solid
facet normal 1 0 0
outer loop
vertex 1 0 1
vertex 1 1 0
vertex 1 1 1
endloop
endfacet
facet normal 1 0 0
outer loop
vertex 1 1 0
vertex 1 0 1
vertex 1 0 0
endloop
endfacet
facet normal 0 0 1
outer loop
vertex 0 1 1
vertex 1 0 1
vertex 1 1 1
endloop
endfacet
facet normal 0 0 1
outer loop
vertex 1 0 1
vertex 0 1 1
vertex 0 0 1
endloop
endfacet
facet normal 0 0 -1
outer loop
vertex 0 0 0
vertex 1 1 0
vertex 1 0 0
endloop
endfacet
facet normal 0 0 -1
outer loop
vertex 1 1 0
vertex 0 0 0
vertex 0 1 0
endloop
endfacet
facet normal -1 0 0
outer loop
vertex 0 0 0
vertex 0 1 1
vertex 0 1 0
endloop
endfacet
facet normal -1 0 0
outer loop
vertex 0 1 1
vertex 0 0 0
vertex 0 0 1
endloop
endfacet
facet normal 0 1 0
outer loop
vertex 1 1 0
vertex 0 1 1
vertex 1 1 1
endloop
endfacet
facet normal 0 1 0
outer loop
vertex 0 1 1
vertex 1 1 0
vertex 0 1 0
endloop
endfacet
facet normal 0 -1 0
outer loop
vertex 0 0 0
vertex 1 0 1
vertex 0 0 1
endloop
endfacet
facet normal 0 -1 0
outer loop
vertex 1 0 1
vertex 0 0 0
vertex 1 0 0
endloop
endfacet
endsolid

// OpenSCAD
// CanFactory prototype-board wire guide: one printed piece of a wire-guide design (#152, #170, docs/wire-guide.md): a whole print,
// one separate layer of a print, or one of its separate pegs.
//
// Every number comes from trusted code: wireGuideScad (packages/contracts/src/prototypeWireGuide.ts) works out each print's
// plate, channels, bridges, funnels, pockets and registration from the validated design and passes them as GUIDE, a list
// with one entry per print; PRINT picks this file's print. Nothing of the design but numbers reaches this file.
//
// Frame: the board's (mm). The PCB's underside on z = 0, its corner at the origin, seen from the component side: columns
// along +X, rows along +Y. The print is drawn where it sits on the board, channels open upwards.
//
// GUIDE[PRINT] = [
//   [x0, y0, pitch],                         grid: hole (c, r) at (x0 + c * pitch, y0 + r * pitch)
//   [bx0, by0, bx1, by1, zBase, zTop],       the block
//   plateTop,                                the plate's top, the lowest channel floor
//   [[floor, bridgeBottom], ...],            per channel layer, lowest first (bridgeBottom -1 for the lowest)
//   [[layer, width, [c0, r0, c1, r1, ...]], ...],   wires: their layer, channel width and grid points
//   [[x, y, bottomD, topD], ...],            funnels at the wire ends
//   [[kind, x, y, a, b, top], ...],          pockets: kind 0 a box (x, y, w = a, h = b), 1 a cylinder (centre x, y, d = a)
//   [[x, y, columnD, pinD, pinBottom, columnBottom, top], ...],   mounting-hole bosses (columnBottom -1: no column)
//   [[x, width], ...],                       edge clips at y = 0 and y = W
//   [L, W, t],                               the board
//   layered,                                 1: made as separate layers and pegs (no bosses: holes for the pegs), 0: one piece
//   [[zBottom, zTop], ...],                  layers, lowest first: the slice of the block each is (layered only)
//   [[x, y, d, bottom, top], ...],           the pegs' holes, from `bottom` to `top` (layered only)
//   [[[r, z], ...], ...],                    each peg's outline, turned about its axis, from its lowest point at z = 0
// ]
//
// LAYER -1 and PEG -1: the whole print, drawn where it sits on the board (a one-piece print). LAYER k: its layer k, lying on the
// print bed (its underside on z = 0). PEG j: its peg j, upright, its lowest point on z = 0 at the origin.

GUIDE = [];
PRINT = 0;
LAYER = -1;
PEG = -1;

$fn = 32;
// Fixed dimensions, as WIRE_GUIDE_GEOMETRY.clip.
CLIP_GAP = 0.2; CLIP_WALL = 1.4; CLIP_LIP = 0.6; CLIP_BELOW = 1.4; CLIP_LIP_GAP = 0.15; CLIP_FOOT = 0.6;
// Bridges are this much narrower than the channel they carry, so that their sides never coincide with it.
BRIDGE_INSET = 0.01;

P = GUIDE[PRINT];
grid = P[0]; block = P[1]; plate_top = P[2]; layers = P[3]; wires = P[4];
funnels = P[5]; pockets = P[6]; bosses = P[7]; clips = P[8]; board = P[9];
layered = P[10] == 1; slices = P[11]; holes = P[12]; pegs = P[13];
z_base = block[4]; z_top = block[5];

function at(c, r) = [grid[0] + c * grid[2], grid[1] + r * grid[2]];

// The 2D footprint of a wire's channel: a rectangle per segment, each reaching half the width past its ends (square corners).
module channel_2d(points, width) {
  n = len(points) / 2;
  for (i = [0 : n - 2]) {
    a = at(points[2 * i], points[2 * i + 1]);
    b = at(points[2 * i + 2], points[2 * i + 3]);
    translate([min(a[0], b[0]) - width / 2, min(a[1], b[1]) - width / 2])
      square([abs(b[0] - a[0]) + width, abs(b[1] - a[1]) + width]);
  }
}

// One layer's channels: open from its floor up through the top, except under the bridges of every higher layer.
module layer_cut(layer) {
  difference() {
    translate([0, 0, layers[layer][0]]) linear_extrude(z_top + 1 - layers[layer][0])
      union() for (w = wires) if (w[0] == layer) channel_2d(w[2], w[1]);
    for (higher = [for (i = [0 : len(layers) - 1]) if (i > layer) i])
      translate([0, 0, layers[higher][1]]) linear_extrude(z_top + 2 - layers[higher][1])
        union() for (w = wires) if (w[0] == higher) channel_2d(w[2], w[1] - 2 * BRIDGE_INSET);
  }
}

// One layer's channels alone, open from its floor up through the top (a separate layer: nothing of a higher one is over them).
module own_cut(layer) {
  translate([0, 0, layers[layer][0]]) linear_extrude(z_top + 1 - layers[layer][0])
    union() for (w = wires) if (w[0] == layer) channel_2d(w[2], w[1]);
}

// A funnel at a wire end: a cone from its outlet at the plate's underside to its opening just above the plate's top (the floor of
// the lowest channels), then a shaft up through the top. Below the underside the outlet goes on as a bore, BORE_DEPTH into the
// board's thickness, so that a boss's column or a clip's foot standing on the board beside the hole never closes it. The cone's
// corners sit FUNNEL_KINK above the plate's top and below the underside, so that no ring of it lies in the underside's or a
// floor's plane.
FUNNEL_KINK = 0.05;
BORE_DEPTH = 0.3;
module funnel(f) {
  rb = f[2] / 2; rt = f[3] / 2;
  kink = plate_top + FUNNEL_KINK;
  slope = (rt - rb) / (kink - z_base);
  // the bore's top, under the underside: where the cone is a little narrower than the outlet (never less than half of it)
  below = slope > 0 ? min(FUNNEL_KINK, rb / 2 / slope) : FUNNEL_KINK;
  bore_r = rb - slope * below;
  bore_bottom = min(board[2], z_base - below) - BORE_DEPTH;
  translate([f[0], f[1], 0]) rotate_extrude()
    polygon([[0, bore_bottom], [bore_r, bore_bottom], [bore_r, z_base - below], [rt, kink], [rt, z_top + 1], [0, z_top + 1]]);
}

module pocket(p) {
  if (p[0] == 0) translate([p[1], p[2], z_base - 1]) cube([p[3], p[4], p[5] - z_base + 1]);
  else translate([p[1], p[2], z_base - 1]) cylinder(d = p[3], h = p[5] - z_base + 1);
}

// A boss in a mounting hole: a column standing on the board (when the print stands off it) and a pin into the hole.
module boss(b) {
  translate([b[0], b[1], 0]) {
    if (b[5] >= 0) translate([0, 0, b[5]]) cylinder(d = b[2], h = b[6] - b[5]);
    translate([0, 0, b[4]]) cylinder(d = b[3], h = b[6] - b[4]);
  }
}

// An edge clip at y = 0: a wall outside the board's edge, a lip under it and, when the print stands off the board, a foot on it.
module clip(c) {
  x = c[0]; width = c[1];
  translate([x - width / 2, -CLIP_GAP - CLIP_WALL, -CLIP_BELOW]) cube([width, CLIP_WALL, z_base + CLIP_BELOW + (plate_top - z_base) / 2]);
  translate([x - (width - 0.8) / 2, 0, 0]) rotate([90, 0, 90]) linear_extrude(width - 0.8)
    polygon([[-CLIP_GAP - 0.3, -CLIP_LIP_GAP], [-CLIP_GAP + CLIP_LIP, -CLIP_LIP_GAP], [-CLIP_GAP - 0.3, -CLIP_BELOW + 0.3]]);
  if (z_base - board[2] >= 0.05)
    translate([x - (width - 0.4) / 2, -CLIP_GAP - 0.3, board[2]]) cube([width - 0.4, CLIP_GAP + 0.3 + CLIP_FOOT, z_base - board[2] + (plate_top - z_base) / 2]);
}

// The whole print where it sits on the board, one piece with its bosses; or, for its layer LAYER, the block with that layer's
// channels, the funnels, pockets and the pegs' holes.
module guide() {
  difference() {
    union() {
      translate([block[0], block[1], z_base]) cube([block[2] - block[0], block[3] - block[1], z_top - z_base]);
      if (!layered) for (b = bosses) boss(b);
      for (c = clips) { clip(c); translate([0, board[1], 0]) mirror([0, 1, 0]) clip(c); }
    }
    // a layer holds only its own level's channels: it is closed over the lower levels' wires, which lie in the layers below it
    if (layered && LAYER >= 0) own_cut(LAYER);
    else for (layer = [0 : len(layers) - 1]) layer_cut(layer);
    for (f = funnels) funnel(f);
    for (p = pockets) pocket(p);
    if (layered) for (h = holes) translate([h[0], h[1], h[3]]) cylinder(d = h[2], h = h[4] - h[3], $fn = 64);
  }
}

// Layer k: the slice of the print from its underside to its top (the lowest reaches down to the clips, the highest up to the
// top), moved down onto the print bed.
module layer(k) {
  lo = k == 0 ? -10 : slices[k][0];
  hi = k == len(slices) - 1 ? z_top + 10 : slices[k][1];
  translate([0, 0, -slices[k][0]]) intersection() {
    guide();
    translate([block[0] - 10, block[1] - 10, lo]) cube([block[2] - block[0] + 20, block[3] - block[1] + 20, hi - lo]);
  }
}

if (PEG >= 0) rotate_extrude($fn = 64) polygon(pegs[PEG]);
else if (LAYER >= 0) layer(LAYER);
else guide();
